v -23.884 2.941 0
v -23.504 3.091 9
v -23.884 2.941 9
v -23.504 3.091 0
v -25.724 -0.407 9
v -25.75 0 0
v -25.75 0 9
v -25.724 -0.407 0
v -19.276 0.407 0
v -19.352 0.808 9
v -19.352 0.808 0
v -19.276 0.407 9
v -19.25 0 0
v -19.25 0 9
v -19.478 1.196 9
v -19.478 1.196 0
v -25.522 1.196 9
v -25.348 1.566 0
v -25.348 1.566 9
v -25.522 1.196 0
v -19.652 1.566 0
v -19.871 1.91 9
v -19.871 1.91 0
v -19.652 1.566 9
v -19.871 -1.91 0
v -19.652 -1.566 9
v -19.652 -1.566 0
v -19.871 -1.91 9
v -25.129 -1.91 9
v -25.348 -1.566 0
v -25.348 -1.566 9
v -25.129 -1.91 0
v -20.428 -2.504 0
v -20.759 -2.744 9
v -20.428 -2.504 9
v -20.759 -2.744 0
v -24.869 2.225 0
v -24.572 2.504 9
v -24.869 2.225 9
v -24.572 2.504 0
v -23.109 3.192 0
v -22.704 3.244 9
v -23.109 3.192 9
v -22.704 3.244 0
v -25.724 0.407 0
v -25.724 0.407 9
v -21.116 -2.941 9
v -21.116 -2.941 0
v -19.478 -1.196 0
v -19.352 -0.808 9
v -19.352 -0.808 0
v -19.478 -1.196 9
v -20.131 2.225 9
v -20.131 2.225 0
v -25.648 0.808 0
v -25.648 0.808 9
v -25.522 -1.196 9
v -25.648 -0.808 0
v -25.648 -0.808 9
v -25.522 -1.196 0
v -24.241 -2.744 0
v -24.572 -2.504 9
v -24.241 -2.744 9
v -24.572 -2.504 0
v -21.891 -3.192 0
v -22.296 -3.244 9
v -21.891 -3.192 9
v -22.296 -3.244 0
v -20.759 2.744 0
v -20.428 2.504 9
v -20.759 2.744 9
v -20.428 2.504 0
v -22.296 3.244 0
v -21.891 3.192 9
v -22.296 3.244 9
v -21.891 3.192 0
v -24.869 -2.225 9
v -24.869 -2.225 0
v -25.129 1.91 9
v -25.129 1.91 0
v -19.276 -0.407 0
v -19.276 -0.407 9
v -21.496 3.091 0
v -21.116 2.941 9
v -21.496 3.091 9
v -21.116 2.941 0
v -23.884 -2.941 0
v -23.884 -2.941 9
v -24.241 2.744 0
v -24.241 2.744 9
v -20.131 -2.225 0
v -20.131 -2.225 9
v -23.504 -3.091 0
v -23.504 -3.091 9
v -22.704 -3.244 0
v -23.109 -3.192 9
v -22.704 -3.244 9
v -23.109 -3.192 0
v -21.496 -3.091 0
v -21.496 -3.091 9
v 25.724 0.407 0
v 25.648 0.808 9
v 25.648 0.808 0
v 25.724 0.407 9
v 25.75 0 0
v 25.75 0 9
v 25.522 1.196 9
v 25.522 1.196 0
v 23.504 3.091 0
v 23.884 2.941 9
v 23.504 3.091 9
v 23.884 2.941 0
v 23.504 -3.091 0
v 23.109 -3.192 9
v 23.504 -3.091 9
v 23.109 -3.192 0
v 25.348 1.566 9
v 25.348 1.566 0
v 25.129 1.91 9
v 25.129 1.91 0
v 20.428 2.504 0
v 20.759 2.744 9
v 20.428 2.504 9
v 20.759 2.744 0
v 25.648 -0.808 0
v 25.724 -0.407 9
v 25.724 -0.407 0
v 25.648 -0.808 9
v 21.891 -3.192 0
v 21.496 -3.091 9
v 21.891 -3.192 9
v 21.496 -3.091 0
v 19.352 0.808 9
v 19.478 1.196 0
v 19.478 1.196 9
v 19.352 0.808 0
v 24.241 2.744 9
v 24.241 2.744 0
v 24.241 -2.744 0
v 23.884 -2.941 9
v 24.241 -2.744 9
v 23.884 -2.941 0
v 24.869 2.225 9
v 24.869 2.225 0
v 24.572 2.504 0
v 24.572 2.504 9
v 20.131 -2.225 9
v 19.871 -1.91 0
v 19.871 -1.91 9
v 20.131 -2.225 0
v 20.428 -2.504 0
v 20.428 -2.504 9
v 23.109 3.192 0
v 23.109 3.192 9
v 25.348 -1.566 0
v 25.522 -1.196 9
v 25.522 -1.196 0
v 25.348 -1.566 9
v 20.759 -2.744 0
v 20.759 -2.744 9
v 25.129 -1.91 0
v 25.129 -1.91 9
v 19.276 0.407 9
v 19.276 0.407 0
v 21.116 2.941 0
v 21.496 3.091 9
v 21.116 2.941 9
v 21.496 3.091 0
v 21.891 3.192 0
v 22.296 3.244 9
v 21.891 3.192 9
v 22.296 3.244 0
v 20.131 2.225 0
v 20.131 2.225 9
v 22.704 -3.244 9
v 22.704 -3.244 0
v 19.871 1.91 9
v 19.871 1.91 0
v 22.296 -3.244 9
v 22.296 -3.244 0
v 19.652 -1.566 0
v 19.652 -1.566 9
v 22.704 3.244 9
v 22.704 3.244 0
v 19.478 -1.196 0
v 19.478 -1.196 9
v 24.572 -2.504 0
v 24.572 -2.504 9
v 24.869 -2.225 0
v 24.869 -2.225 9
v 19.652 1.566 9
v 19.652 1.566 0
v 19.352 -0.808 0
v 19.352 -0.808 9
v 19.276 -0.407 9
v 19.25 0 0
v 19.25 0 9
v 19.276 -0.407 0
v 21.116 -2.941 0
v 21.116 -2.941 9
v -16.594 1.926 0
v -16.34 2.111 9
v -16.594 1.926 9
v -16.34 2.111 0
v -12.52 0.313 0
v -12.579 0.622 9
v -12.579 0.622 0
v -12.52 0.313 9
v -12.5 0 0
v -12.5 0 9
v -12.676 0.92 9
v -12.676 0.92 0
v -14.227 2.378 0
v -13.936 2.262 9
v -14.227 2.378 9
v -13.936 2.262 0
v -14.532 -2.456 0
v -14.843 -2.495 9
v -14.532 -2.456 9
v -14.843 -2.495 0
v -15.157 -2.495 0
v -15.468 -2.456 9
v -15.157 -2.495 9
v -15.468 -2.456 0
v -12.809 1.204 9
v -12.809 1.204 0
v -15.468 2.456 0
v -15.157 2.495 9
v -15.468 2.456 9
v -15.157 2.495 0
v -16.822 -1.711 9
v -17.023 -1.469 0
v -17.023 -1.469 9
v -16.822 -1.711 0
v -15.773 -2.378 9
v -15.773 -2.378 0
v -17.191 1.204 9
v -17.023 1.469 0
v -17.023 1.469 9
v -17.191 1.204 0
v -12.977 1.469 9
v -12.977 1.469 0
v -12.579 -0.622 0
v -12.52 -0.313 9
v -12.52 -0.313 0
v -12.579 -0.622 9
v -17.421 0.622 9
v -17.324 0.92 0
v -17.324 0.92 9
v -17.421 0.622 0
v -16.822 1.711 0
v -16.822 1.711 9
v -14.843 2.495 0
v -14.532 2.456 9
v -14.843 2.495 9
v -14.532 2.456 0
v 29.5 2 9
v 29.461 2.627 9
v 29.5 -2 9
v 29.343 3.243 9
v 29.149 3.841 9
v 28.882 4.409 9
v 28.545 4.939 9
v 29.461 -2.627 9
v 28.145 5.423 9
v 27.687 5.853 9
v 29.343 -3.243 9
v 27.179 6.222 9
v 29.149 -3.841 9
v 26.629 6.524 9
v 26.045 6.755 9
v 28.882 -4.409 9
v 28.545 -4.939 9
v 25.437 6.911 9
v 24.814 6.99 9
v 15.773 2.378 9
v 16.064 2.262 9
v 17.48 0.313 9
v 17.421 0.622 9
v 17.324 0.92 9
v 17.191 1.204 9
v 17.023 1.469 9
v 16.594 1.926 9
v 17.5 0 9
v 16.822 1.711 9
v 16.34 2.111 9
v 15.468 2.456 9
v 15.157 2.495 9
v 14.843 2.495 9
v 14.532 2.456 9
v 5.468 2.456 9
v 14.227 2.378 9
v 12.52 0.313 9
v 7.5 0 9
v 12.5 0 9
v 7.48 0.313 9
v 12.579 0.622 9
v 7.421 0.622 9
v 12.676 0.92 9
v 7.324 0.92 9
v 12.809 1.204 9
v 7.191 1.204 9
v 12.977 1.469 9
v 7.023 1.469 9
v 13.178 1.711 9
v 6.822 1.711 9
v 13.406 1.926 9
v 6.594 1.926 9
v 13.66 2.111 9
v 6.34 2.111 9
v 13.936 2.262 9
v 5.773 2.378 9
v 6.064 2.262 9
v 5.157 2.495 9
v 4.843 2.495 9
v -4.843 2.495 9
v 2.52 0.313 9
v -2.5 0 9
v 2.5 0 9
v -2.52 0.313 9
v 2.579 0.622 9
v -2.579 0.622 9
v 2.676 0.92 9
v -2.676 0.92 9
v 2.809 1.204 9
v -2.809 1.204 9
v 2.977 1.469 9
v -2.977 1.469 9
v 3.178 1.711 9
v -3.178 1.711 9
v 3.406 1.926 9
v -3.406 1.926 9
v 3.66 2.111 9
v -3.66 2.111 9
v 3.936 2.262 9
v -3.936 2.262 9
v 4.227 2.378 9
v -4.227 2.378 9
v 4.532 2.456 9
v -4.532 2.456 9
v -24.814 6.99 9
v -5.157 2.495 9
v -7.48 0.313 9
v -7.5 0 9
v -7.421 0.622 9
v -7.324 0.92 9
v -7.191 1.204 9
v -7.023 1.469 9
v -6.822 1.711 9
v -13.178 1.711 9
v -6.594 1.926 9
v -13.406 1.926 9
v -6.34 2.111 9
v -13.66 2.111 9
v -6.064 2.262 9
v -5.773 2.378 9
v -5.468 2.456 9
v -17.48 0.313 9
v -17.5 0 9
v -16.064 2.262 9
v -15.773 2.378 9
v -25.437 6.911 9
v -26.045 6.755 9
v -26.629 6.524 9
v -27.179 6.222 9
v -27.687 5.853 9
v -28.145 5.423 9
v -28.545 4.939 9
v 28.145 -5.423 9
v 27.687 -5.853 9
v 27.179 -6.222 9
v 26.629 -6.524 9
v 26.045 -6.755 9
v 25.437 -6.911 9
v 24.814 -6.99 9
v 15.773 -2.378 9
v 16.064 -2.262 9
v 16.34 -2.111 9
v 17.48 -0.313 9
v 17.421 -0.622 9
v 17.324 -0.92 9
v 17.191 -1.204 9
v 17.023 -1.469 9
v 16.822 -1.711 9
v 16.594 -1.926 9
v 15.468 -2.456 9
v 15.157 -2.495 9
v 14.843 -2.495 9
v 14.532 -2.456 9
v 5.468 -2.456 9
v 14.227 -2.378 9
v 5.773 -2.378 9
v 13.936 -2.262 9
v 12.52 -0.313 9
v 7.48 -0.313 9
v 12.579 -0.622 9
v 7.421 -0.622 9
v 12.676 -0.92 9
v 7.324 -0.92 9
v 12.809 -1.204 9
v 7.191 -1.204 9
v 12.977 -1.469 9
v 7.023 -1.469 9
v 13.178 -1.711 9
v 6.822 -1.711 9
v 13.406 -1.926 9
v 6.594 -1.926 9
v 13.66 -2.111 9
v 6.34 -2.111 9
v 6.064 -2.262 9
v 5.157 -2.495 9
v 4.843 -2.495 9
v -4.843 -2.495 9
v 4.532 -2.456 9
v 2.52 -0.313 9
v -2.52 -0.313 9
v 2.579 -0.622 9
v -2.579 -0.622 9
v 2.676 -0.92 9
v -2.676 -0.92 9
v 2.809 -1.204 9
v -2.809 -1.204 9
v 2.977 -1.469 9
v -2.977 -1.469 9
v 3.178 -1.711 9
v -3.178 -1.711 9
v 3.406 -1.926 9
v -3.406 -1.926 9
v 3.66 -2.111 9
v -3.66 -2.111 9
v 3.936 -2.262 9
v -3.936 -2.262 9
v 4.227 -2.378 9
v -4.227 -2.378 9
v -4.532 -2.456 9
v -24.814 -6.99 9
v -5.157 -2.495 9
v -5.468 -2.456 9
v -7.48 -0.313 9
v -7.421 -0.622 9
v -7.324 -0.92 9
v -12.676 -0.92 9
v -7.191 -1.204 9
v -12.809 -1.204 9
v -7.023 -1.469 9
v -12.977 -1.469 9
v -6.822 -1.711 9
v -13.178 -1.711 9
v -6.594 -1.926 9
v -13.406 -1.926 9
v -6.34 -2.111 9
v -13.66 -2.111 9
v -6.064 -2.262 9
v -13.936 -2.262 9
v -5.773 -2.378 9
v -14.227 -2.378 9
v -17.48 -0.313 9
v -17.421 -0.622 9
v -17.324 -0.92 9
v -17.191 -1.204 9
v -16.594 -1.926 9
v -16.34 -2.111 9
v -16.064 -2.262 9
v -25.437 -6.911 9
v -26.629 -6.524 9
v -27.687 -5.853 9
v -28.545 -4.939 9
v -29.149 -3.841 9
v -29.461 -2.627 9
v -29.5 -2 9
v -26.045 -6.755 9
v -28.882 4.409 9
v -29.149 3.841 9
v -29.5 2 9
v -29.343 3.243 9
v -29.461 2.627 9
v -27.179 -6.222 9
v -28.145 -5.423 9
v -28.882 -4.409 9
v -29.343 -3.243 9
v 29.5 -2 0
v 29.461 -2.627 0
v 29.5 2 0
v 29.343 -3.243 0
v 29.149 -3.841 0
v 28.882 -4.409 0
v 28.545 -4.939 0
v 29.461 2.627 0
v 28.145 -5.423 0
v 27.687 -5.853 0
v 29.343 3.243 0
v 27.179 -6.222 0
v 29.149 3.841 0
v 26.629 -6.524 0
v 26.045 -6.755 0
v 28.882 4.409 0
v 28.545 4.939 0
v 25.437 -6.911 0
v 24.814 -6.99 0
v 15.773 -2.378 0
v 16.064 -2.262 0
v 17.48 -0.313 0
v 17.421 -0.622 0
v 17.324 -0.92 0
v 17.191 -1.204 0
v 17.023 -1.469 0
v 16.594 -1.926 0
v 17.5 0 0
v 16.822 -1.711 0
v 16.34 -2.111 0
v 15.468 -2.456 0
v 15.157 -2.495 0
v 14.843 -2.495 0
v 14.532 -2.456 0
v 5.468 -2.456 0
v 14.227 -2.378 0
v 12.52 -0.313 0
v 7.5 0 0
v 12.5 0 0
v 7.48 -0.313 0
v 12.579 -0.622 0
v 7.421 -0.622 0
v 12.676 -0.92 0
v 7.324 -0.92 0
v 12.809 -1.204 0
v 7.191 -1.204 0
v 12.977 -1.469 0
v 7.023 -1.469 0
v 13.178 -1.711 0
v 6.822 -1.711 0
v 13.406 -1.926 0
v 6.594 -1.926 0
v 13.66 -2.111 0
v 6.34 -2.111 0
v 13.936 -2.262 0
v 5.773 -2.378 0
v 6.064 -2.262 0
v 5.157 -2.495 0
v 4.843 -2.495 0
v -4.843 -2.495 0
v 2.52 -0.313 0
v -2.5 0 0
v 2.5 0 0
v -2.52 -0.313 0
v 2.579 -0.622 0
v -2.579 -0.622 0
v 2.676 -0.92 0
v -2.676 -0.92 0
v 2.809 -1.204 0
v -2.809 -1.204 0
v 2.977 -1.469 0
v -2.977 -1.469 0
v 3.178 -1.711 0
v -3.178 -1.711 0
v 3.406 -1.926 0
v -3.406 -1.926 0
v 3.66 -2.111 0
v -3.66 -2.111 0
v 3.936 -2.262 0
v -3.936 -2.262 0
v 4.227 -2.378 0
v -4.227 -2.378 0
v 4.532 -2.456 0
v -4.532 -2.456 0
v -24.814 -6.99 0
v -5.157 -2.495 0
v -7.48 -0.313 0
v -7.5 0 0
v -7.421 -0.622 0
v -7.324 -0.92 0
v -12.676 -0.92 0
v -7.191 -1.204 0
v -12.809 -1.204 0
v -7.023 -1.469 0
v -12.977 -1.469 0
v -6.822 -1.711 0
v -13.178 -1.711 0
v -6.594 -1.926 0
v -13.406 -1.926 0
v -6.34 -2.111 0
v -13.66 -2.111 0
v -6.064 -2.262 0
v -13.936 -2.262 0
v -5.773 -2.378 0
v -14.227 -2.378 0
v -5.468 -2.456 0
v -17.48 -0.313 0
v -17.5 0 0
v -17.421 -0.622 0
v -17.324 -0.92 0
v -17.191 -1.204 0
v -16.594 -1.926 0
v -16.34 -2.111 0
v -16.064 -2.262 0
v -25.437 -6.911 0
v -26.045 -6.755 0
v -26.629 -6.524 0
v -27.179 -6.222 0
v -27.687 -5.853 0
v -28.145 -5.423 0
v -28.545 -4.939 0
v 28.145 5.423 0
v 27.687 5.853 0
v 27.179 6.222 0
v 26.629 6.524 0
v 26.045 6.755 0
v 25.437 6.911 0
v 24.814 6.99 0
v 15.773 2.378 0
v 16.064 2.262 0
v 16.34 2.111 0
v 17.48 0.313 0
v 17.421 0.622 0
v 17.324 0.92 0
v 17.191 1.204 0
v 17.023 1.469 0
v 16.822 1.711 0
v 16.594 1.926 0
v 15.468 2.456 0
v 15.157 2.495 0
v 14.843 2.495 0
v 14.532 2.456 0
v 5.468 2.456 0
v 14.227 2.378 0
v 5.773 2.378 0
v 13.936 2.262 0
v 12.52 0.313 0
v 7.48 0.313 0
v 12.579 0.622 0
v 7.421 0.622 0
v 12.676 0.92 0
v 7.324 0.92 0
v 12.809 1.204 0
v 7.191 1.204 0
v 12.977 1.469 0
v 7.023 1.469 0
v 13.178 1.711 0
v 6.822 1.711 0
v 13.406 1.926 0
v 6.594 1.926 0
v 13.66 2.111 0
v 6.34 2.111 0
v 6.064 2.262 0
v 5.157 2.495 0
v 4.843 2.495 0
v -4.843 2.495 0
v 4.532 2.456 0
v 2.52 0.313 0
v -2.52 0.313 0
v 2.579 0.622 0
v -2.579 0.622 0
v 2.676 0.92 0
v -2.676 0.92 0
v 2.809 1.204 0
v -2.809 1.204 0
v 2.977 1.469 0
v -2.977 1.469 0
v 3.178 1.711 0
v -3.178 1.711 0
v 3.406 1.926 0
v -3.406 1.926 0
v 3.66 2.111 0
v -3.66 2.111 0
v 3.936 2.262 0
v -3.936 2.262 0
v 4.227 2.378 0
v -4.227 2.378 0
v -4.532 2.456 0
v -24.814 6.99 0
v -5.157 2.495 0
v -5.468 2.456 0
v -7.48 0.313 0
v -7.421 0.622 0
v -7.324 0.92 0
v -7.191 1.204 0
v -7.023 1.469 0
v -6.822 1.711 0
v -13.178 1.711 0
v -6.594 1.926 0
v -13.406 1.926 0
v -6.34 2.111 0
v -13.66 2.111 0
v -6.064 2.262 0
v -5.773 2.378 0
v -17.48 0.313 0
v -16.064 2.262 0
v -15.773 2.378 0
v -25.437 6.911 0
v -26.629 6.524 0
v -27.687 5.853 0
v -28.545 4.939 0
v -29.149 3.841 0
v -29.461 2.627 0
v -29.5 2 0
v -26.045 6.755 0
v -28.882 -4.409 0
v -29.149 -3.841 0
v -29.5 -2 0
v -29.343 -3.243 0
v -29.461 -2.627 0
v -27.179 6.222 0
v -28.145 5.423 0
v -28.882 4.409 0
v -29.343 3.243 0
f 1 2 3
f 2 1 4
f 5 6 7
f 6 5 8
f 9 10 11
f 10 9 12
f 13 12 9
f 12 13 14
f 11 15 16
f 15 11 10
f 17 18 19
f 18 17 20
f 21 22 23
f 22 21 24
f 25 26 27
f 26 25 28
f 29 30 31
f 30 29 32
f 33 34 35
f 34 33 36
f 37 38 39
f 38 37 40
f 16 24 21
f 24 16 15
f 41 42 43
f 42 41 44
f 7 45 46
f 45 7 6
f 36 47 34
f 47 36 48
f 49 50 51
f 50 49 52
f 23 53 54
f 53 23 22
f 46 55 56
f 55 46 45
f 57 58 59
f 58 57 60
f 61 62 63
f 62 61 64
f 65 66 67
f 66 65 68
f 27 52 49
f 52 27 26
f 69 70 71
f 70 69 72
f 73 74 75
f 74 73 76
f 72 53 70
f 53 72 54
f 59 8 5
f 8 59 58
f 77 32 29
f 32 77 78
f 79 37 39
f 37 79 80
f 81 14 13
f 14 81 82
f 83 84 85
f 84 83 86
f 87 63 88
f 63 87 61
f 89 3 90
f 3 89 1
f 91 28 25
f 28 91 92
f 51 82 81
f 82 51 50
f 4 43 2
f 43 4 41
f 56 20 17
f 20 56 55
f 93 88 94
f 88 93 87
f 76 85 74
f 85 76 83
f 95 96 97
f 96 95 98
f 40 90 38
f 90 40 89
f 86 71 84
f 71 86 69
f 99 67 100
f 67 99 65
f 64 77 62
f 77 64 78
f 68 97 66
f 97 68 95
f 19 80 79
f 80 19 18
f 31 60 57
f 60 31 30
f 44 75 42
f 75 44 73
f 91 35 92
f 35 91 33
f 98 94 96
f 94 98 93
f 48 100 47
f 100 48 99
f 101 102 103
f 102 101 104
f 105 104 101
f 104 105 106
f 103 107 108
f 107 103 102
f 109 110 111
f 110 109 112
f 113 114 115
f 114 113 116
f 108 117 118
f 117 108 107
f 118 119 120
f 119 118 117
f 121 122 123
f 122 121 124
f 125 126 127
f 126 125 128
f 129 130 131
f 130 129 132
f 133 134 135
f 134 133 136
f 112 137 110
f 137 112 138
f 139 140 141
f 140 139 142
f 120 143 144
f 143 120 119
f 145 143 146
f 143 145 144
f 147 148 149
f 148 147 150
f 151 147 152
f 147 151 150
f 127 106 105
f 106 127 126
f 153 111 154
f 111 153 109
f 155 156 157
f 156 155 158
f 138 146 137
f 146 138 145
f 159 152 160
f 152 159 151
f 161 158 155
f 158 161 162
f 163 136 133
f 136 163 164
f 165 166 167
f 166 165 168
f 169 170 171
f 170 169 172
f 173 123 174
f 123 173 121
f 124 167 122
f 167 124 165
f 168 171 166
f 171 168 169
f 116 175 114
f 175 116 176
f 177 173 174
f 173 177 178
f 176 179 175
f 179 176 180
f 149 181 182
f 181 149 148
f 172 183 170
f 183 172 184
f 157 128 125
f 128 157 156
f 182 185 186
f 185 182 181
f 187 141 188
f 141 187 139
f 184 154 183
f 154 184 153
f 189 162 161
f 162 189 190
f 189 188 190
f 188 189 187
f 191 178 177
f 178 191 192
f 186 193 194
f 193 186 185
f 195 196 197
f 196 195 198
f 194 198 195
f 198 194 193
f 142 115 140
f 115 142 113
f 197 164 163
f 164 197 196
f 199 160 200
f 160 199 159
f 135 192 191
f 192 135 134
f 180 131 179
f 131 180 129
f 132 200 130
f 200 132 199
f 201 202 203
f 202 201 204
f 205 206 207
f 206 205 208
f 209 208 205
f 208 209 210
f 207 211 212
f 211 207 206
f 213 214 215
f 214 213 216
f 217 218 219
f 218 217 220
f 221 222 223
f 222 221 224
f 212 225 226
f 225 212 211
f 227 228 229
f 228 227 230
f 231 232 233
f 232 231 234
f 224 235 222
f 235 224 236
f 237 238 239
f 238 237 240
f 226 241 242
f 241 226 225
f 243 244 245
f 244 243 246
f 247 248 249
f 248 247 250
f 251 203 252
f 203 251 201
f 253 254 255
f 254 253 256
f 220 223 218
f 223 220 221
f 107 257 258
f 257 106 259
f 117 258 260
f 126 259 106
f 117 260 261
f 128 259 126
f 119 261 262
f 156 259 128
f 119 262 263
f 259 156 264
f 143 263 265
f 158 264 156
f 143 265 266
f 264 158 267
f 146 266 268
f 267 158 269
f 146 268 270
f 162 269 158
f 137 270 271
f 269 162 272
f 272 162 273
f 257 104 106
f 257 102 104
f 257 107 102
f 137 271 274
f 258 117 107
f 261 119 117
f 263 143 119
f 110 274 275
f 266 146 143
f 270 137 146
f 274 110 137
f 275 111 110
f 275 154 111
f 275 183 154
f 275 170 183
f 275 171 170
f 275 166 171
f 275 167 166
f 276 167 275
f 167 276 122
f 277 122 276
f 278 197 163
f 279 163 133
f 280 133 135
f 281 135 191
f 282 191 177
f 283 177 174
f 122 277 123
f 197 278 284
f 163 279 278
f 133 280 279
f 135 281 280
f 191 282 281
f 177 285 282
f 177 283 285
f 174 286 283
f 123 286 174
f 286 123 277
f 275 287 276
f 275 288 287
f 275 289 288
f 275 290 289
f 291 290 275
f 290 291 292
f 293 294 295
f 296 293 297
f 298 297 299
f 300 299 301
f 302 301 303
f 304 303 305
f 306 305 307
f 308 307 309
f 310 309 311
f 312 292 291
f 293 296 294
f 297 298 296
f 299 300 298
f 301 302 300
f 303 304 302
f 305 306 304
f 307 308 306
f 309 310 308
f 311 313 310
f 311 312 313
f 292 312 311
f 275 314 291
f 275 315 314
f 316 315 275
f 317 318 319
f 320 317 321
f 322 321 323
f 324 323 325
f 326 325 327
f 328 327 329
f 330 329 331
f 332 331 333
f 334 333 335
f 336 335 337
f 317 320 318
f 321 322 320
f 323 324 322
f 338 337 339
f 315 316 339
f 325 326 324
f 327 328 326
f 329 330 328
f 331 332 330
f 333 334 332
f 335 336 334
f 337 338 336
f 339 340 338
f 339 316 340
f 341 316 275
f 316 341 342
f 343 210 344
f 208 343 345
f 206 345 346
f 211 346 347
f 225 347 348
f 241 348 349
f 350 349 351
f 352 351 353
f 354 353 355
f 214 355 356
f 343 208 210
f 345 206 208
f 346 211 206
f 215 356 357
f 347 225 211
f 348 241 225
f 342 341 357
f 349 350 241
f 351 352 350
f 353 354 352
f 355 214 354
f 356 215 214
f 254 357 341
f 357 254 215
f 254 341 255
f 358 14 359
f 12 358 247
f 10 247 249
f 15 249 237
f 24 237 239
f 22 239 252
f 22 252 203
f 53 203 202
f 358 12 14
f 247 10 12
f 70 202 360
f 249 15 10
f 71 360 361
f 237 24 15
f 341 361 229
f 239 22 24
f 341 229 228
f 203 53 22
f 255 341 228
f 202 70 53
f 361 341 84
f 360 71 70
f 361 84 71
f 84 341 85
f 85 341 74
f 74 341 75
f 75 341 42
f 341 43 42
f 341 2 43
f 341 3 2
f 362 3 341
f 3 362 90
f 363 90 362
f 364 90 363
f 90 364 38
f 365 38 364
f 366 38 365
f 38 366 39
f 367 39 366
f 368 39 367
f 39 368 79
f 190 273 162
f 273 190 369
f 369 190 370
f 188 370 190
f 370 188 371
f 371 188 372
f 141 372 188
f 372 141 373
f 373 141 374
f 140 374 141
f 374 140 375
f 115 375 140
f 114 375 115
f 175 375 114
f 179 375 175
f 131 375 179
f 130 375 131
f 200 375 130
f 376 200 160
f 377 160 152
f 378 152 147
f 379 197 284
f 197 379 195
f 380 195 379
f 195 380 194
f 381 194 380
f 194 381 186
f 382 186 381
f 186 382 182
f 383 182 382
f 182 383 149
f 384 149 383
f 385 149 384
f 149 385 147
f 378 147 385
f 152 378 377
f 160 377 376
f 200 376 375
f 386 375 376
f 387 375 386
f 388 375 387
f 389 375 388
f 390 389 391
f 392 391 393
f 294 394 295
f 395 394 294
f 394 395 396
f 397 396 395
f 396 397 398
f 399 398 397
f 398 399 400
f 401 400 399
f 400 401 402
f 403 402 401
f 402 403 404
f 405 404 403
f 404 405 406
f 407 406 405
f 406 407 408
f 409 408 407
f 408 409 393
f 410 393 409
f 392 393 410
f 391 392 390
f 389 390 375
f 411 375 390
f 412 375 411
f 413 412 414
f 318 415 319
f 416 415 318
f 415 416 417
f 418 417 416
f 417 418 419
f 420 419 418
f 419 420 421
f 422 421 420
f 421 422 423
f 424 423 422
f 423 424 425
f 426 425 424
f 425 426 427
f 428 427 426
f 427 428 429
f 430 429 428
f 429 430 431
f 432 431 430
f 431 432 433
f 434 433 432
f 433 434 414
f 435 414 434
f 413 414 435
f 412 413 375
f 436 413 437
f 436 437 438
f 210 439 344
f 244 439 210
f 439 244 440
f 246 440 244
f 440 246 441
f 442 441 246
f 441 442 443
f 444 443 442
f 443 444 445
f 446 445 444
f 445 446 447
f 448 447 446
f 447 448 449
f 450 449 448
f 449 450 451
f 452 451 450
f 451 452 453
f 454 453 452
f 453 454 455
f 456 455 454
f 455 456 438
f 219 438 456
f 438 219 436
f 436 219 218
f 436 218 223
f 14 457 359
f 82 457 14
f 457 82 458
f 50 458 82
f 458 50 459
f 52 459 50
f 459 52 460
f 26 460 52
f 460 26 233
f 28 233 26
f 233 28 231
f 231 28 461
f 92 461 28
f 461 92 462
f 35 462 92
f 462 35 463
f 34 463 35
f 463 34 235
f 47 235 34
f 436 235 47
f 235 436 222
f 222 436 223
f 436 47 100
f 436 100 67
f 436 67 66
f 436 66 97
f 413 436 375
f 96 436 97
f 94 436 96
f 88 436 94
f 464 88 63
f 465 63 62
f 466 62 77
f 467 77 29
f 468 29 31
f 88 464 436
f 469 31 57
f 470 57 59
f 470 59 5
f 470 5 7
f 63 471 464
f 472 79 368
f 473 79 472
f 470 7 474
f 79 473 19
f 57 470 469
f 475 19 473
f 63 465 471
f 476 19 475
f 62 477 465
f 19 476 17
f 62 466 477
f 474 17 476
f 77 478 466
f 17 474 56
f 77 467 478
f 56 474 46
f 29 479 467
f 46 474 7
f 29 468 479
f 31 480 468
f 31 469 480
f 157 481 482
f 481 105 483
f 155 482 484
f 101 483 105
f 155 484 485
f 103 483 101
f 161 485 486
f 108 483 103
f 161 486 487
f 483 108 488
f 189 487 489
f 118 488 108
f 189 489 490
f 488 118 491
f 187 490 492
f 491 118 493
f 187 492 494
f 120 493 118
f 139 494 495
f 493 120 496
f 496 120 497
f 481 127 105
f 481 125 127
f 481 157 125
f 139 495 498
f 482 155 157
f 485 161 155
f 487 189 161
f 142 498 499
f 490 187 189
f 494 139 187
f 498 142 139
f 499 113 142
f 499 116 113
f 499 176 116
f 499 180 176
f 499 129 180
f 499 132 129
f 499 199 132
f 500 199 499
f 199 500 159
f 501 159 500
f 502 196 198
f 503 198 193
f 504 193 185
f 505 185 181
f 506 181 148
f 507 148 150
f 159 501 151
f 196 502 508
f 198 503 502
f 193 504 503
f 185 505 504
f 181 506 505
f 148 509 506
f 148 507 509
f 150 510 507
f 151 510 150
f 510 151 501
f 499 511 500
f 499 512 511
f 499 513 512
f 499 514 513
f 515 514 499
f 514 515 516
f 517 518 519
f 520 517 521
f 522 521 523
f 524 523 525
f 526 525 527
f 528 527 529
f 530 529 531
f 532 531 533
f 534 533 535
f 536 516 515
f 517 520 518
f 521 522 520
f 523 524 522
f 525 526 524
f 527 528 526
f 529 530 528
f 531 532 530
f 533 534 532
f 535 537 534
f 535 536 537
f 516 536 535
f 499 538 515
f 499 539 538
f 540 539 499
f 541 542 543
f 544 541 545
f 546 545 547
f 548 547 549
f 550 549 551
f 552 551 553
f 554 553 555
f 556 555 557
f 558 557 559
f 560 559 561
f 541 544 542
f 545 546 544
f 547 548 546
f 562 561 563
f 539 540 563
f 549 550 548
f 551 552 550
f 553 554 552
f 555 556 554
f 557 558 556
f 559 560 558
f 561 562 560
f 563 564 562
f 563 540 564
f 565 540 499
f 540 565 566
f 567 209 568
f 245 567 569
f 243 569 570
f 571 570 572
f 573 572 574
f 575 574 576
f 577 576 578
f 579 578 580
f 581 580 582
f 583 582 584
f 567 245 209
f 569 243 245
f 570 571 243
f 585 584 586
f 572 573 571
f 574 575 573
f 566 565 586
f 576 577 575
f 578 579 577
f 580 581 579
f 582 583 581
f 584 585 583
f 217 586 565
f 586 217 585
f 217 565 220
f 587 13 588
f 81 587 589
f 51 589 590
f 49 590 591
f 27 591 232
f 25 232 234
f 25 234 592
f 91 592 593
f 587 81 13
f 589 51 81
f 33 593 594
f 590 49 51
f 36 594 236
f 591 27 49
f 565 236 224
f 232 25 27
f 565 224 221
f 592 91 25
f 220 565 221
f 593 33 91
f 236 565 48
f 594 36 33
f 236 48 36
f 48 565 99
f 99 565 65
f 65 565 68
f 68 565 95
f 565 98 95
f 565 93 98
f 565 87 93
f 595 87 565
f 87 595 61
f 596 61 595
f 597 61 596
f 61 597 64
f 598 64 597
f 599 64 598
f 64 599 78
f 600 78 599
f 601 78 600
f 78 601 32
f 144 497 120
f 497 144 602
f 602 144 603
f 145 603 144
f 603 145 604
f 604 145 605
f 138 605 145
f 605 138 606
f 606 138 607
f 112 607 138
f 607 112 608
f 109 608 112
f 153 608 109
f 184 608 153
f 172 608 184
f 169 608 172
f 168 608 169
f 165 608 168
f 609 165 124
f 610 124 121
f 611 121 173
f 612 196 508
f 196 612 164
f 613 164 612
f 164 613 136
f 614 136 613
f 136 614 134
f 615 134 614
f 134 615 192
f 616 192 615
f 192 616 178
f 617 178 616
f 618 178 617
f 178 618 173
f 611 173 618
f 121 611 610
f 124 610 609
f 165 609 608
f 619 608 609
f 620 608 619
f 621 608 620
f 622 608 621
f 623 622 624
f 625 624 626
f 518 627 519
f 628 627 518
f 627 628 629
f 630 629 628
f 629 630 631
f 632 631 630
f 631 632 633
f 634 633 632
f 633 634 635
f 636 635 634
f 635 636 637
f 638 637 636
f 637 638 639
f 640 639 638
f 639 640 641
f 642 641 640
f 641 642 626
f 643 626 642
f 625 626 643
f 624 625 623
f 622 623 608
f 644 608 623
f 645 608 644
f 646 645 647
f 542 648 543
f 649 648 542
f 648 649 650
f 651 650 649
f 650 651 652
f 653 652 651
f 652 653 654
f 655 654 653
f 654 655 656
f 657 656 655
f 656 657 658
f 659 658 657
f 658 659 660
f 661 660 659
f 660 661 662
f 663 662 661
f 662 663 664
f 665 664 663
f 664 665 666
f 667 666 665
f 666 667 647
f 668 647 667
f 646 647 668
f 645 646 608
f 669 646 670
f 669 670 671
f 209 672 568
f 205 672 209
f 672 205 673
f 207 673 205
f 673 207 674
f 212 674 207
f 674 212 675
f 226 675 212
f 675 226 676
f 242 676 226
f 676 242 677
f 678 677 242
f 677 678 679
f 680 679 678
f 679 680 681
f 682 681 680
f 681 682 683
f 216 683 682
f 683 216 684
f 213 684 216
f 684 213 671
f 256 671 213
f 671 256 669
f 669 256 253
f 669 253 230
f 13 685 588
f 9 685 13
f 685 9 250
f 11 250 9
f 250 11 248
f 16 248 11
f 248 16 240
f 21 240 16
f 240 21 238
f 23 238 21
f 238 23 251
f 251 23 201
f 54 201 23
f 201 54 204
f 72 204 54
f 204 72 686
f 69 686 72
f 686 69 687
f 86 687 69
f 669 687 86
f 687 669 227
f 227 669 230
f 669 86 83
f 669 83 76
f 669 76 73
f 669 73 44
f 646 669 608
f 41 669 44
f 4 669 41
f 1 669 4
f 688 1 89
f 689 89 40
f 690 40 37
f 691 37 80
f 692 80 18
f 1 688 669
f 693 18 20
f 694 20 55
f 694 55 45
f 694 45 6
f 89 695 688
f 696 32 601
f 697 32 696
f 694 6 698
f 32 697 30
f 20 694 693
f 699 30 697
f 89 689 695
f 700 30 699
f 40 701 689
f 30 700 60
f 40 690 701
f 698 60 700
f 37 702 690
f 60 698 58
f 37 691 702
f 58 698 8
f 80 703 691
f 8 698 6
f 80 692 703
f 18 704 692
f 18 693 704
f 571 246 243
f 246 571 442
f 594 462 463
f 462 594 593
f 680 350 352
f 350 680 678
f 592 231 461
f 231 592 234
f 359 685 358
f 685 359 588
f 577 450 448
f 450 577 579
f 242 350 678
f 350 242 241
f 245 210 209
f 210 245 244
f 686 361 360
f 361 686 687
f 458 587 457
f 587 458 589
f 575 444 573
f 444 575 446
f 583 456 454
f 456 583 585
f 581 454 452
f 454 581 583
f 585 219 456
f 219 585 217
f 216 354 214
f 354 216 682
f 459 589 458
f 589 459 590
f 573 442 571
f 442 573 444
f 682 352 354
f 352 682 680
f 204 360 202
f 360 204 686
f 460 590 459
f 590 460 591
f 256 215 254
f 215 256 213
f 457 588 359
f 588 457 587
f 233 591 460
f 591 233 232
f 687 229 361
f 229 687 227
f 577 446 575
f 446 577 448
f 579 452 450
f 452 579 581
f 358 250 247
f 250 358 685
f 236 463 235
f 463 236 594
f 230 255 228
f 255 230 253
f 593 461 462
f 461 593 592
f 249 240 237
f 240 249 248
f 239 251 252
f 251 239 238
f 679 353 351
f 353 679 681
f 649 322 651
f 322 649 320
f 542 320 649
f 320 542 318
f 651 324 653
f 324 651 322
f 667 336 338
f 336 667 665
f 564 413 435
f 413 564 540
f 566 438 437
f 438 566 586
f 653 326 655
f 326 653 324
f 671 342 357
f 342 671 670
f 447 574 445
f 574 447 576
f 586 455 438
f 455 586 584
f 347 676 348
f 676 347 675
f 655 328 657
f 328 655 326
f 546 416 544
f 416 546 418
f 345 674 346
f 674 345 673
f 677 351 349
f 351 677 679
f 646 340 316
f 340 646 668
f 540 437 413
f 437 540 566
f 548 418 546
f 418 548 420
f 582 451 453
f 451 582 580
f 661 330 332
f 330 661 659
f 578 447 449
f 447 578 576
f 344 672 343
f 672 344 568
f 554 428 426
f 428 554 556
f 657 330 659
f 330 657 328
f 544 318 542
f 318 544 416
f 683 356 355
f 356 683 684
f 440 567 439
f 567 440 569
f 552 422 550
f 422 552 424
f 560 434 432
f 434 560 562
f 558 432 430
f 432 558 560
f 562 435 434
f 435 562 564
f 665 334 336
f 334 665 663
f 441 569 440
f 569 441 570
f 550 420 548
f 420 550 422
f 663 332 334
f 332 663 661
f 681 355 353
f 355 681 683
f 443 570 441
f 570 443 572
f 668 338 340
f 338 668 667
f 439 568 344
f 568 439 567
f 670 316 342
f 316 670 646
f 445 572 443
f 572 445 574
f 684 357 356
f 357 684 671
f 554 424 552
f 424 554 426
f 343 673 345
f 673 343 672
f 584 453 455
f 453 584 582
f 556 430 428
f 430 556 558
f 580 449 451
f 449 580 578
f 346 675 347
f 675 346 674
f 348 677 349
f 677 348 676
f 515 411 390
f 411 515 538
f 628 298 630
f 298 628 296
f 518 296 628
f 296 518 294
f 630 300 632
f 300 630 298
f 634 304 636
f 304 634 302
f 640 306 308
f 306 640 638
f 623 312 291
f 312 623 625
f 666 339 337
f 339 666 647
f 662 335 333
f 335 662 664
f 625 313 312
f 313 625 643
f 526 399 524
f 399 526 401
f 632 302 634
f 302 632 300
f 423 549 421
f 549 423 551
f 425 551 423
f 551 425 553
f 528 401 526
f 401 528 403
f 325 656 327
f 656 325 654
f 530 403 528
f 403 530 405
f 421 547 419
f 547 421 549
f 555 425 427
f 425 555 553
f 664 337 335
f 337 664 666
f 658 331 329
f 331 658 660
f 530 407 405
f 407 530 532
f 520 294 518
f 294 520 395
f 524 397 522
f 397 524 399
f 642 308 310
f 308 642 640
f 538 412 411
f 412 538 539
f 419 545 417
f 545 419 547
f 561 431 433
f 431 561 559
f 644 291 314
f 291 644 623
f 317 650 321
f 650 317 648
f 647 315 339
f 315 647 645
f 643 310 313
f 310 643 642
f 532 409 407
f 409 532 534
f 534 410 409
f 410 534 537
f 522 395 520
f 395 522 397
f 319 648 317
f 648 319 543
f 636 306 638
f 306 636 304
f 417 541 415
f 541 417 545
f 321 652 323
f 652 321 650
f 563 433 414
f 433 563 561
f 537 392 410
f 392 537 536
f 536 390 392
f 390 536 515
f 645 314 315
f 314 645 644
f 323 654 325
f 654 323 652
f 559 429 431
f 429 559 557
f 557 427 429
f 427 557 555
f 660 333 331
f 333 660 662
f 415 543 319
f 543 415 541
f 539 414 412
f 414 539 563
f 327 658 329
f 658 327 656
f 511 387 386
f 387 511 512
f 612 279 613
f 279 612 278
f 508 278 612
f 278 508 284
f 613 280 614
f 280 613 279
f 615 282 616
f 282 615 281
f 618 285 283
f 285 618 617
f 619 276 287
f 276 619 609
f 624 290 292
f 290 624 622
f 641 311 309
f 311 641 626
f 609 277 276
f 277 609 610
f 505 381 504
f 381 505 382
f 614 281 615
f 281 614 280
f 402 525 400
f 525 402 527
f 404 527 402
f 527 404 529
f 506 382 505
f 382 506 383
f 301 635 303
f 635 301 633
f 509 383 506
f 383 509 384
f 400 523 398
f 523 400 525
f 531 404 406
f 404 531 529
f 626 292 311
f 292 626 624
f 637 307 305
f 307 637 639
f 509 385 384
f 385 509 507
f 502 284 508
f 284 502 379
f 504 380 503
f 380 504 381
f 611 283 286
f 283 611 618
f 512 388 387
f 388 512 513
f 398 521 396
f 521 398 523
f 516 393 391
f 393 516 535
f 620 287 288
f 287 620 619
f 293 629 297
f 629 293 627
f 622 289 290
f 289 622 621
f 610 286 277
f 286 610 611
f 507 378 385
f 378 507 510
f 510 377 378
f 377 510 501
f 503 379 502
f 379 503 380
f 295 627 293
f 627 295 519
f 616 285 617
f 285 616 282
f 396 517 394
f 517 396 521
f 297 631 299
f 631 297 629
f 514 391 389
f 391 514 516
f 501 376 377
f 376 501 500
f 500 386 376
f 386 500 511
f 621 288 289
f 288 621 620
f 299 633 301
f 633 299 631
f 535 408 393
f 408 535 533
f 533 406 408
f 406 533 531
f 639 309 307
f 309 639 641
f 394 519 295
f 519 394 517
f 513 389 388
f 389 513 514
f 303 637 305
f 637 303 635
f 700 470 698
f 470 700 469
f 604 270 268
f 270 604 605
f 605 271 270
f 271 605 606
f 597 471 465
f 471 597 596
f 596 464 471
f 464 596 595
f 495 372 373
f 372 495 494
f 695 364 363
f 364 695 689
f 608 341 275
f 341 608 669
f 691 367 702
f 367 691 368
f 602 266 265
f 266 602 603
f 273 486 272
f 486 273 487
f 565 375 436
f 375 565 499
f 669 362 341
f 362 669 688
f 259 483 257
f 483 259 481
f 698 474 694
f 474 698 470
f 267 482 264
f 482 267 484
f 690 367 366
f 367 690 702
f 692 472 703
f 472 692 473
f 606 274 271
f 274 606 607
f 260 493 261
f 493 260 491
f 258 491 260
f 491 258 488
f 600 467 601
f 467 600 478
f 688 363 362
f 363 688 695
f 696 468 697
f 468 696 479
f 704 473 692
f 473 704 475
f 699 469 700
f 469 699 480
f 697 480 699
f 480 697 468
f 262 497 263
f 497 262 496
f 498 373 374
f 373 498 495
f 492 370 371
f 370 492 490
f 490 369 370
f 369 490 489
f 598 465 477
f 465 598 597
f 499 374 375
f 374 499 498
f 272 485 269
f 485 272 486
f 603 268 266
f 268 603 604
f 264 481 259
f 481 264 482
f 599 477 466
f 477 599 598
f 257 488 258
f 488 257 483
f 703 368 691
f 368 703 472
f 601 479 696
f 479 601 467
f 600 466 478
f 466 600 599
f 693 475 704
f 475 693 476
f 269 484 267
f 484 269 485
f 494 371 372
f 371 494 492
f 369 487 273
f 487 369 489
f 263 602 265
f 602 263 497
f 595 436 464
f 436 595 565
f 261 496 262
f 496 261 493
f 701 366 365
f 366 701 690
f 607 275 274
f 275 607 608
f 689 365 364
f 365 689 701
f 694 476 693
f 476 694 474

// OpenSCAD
$fn = 50;


difference() {
	union() {
		hull() {
			translate(v = [-24.5000000000, 2.0000000000, 0]) {
				cylinder(h = 9, r = 5);
			}
			translate(v = [24.5000000000, 2.0000000000, 0]) {
				cylinder(h = 9, r = 5);
			}
			translate(v = [-24.5000000000, -2.0000000000, 0]) {
				cylinder(h = 9, r = 5);
			}
			translate(v = [24.5000000000, -2.0000000000, 0]) {
				cylinder(h = 9, r = 5);
			}
		}
	}
	union() {
		#translate(v = [-22.5000000000, 0.0000000000, 0]) {
			cylinder(h = 9, r = 3.2500000000);
		}
		#translate(v = [22.5000000000, 0.0000000000, 0]) {
			cylinder(h = 9, r = 3.2500000000);
		}
		#translate(v = [-22.5000000000, 0.0000000000, -100.0000000000]) {
			cylinder(h = 200, r = 3.2500000000);
		}
		#translate(v = [-22.5000000000, 0.0000000000, -100.0000000000]) {
			cylinder(h = 200, r = 3.2500000000);
		}
		#translate(v = [22.5000000000, 0.0000000000, -100.0000000000]) {
			cylinder(h = 200, r = 3.2500000000);
		}
		#translate(v = [22.5000000000, 0.0000000000, -100.0000000000]) {
			cylinder(h = 200, r = 3.2500000000);
		}
		#translate(v = [-22.5000000000, 0.0000000000, 0]) {
			cylinder(h = 9, r = 1.8000000000);
		}
		#translate(v = [22.5000000000, 0.0000000000, 0]) {
			cylinder(h = 9, r = 1.8000000000);
		}
		#translate(v = [-22.5000000000, 0.0000000000, 0]) {
			cylinder(h = 9, r = 1.8000000000);
		}
		#translate(v = [22.5000000000, 0.0000000000, 0]) {
			cylinder(h = 9, r = 1.8000000000);
		}
		#translate(v = [-22.5000000000, 0.0000000000, 0]) {
			cylinder(h = 9, r = 1.8000000000);
		}
		#translate(v = [22.5000000000, 0.0000000000, 0]) {
			cylinder(h = 9, r = 1.8000000000);
		}
		#translate(v = [-15.0000000000, 0, 0]) {
			cylinder(h = 9, r = 2.5000000000);
		}
		#translate(v = [-5.0000000000, 0, 0]) {
			cylinder(h = 9, r = 2.5000000000);
		}
		#translate(v = [5.0000000000, 0, 0]) {
			cylinder(h = 9, r = 2.5000000000);
		}
		#translate(v = [15.0000000000, 0, 0]) {
			cylinder(h = 9, r = 2.5000000000);
		}
	}
}
